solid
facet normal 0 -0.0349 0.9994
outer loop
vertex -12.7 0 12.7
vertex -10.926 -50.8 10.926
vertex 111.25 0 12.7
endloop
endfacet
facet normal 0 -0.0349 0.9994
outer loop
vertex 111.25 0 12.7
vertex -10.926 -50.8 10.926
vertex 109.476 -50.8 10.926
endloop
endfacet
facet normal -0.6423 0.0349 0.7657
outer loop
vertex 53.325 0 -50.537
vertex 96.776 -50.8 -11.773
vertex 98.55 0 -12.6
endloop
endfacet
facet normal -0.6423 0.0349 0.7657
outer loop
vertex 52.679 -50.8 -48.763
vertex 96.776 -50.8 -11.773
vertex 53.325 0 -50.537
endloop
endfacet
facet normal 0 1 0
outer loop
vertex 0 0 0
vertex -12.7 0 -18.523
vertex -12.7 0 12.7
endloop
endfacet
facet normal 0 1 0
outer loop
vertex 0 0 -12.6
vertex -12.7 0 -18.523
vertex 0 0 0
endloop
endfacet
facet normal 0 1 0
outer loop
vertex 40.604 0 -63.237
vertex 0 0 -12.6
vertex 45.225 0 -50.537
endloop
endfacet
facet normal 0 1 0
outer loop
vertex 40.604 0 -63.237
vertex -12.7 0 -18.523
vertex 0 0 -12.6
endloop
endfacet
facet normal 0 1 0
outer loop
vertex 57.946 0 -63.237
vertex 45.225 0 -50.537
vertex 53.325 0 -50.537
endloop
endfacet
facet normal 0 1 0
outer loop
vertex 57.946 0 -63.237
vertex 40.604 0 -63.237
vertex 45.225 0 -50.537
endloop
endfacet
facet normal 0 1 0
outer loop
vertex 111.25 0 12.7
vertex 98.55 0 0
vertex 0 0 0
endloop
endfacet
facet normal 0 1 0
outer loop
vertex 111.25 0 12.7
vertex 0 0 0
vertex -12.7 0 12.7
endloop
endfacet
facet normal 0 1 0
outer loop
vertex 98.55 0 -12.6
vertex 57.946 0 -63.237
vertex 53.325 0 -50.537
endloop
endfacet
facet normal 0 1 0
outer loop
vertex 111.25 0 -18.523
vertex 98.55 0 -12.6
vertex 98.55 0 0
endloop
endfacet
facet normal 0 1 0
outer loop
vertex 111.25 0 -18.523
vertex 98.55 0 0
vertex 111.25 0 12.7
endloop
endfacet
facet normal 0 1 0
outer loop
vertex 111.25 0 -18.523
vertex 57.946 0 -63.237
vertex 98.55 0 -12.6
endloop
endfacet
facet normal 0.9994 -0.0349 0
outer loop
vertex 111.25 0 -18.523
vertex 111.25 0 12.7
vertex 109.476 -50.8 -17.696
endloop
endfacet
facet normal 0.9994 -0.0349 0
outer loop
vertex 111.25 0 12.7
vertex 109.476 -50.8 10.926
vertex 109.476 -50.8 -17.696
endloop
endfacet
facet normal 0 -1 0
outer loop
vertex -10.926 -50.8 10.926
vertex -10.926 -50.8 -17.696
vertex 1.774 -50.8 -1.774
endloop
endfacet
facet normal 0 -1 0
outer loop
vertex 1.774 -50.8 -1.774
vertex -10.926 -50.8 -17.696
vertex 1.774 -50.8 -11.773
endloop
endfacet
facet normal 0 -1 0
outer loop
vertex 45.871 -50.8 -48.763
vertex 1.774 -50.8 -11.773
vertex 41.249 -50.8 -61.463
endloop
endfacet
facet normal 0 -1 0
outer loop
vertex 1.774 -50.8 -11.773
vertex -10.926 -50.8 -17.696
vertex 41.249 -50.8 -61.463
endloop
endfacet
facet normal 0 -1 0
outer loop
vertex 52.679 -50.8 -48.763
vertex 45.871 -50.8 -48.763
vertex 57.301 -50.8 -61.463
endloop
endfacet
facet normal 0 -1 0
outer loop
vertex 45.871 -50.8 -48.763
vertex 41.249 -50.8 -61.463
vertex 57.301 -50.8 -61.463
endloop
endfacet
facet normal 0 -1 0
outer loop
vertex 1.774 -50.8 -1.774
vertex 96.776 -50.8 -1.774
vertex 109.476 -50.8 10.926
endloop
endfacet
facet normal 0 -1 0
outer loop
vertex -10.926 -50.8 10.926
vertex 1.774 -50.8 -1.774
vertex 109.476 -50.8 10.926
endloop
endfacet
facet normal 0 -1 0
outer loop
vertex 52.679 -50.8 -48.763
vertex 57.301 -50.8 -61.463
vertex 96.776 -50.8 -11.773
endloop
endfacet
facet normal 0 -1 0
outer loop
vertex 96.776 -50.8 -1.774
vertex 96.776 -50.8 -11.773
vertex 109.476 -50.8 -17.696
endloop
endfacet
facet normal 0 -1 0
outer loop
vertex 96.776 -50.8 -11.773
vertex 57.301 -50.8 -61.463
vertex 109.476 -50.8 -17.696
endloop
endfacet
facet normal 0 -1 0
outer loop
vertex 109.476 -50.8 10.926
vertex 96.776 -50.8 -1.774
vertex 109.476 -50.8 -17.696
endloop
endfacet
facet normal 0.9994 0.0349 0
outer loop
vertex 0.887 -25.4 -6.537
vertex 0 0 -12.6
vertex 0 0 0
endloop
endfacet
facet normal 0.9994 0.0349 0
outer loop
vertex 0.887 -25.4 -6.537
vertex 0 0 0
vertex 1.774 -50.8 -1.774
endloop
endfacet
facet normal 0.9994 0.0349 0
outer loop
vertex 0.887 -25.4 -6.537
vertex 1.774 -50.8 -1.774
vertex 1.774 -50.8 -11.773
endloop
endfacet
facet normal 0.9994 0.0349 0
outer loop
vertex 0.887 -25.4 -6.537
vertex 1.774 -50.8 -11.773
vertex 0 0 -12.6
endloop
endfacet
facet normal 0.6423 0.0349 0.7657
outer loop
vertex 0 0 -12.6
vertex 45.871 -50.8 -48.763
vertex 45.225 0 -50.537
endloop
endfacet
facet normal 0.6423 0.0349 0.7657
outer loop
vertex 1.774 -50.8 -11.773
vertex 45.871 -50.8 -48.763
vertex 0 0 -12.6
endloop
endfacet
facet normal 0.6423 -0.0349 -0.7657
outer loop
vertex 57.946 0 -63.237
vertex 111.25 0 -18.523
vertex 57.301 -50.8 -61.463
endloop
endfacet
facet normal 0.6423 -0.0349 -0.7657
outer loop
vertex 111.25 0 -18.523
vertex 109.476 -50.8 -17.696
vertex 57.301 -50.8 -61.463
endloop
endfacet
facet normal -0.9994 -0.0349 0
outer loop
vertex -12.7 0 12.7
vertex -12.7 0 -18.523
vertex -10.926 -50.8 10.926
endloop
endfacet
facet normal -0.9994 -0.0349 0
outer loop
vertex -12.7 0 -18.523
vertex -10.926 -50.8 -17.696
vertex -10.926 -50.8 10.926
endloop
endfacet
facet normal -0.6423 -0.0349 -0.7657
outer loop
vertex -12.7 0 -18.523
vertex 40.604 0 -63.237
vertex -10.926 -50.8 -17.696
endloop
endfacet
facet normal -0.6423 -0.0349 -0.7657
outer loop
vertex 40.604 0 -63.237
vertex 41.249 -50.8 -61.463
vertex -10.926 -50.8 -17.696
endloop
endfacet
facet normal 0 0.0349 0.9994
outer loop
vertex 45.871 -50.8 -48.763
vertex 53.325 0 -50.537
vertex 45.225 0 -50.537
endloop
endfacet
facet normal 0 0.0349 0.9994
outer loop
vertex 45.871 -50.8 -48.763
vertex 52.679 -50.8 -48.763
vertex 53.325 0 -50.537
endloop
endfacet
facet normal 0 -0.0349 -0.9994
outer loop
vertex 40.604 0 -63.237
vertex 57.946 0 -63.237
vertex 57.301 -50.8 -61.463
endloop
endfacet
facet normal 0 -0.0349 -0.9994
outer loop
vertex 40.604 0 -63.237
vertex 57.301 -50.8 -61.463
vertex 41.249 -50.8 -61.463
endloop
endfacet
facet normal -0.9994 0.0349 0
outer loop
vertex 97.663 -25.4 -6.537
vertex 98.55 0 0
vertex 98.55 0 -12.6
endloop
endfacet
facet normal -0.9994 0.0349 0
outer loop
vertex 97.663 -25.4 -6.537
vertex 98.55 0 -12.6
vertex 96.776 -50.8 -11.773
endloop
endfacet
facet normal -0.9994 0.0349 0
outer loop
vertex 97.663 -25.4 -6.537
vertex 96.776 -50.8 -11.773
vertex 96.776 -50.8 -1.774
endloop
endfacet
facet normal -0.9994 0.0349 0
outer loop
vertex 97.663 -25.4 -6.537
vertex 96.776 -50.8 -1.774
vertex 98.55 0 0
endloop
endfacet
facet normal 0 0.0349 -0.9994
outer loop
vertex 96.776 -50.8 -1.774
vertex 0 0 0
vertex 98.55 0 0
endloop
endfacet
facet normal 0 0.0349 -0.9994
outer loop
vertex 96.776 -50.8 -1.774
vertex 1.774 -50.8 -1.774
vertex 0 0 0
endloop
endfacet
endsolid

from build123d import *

# Parameters (mm, degrees)
SALIENTE_EXTRUIR1_DEPTH = 2.54
SALIENTE_EXTRUIR2_DEPTH = 50.8
SALIENTE_EXTRUIR2_TAPER = 2
CORTAR_EXTRUIR1_DEPTH   = 50.8
CORTAR_EXTRUIR1_TAPER   = 2


with BuildPart() as part:
    # Croquis1 → Saliente-Extruir1 (new body)
    with BuildSketch(Plane(origin=(0, 0, 0), x_dir=(1, 0, 0), z_dir=(0, 1, 0))):
        Polygon((0, 0), (98.55, 0), (98.55, 12.6), (53.325, 50.537320346), (45.225, 50.537320346), (0, 12.6), align=None)
    extrude(amount=-SALIENTE_EXTRUIR1_DEPTH)

    # Croquis2 → Saliente-Extruir2 (add)
    with BuildSketch(Plane(origin=(0, 0, 0), x_dir=(1, 0, 0), z_dir=(0, 1, 0))):
        Polygon((-12.7, 18.52320689), (-12.7, -12.7), (111.25, -12.7), (111.25, 18.52320689), (57.94639915, 63.237320346), (40.60360085, 63.237320346), align=None)
    extrude(amount=-SALIENTE_EXTRUIR2_DEPTH, taper=SALIENTE_EXTRUIR2_TAPER)

    # Croquis3 → Cortar-Extruir1 (cut)
    with BuildSketch(Plane(origin=(0, 0, 0), x_dir=(1, 0, 0), z_dir=(0, 1, 0))):
        Polygon((0, 0), (98.55, 0), (98.55, 12.6), (53.325, 50.537320346), (45.225, 50.537320346), (0, 12.6), align=None)
    extrude(amount=-CORTAR_EXTRUIR1_DEPTH, taper=CORTAR_EXTRUIR1_TAPER, mode=Mode.SUBTRACT)


solid = part.part
